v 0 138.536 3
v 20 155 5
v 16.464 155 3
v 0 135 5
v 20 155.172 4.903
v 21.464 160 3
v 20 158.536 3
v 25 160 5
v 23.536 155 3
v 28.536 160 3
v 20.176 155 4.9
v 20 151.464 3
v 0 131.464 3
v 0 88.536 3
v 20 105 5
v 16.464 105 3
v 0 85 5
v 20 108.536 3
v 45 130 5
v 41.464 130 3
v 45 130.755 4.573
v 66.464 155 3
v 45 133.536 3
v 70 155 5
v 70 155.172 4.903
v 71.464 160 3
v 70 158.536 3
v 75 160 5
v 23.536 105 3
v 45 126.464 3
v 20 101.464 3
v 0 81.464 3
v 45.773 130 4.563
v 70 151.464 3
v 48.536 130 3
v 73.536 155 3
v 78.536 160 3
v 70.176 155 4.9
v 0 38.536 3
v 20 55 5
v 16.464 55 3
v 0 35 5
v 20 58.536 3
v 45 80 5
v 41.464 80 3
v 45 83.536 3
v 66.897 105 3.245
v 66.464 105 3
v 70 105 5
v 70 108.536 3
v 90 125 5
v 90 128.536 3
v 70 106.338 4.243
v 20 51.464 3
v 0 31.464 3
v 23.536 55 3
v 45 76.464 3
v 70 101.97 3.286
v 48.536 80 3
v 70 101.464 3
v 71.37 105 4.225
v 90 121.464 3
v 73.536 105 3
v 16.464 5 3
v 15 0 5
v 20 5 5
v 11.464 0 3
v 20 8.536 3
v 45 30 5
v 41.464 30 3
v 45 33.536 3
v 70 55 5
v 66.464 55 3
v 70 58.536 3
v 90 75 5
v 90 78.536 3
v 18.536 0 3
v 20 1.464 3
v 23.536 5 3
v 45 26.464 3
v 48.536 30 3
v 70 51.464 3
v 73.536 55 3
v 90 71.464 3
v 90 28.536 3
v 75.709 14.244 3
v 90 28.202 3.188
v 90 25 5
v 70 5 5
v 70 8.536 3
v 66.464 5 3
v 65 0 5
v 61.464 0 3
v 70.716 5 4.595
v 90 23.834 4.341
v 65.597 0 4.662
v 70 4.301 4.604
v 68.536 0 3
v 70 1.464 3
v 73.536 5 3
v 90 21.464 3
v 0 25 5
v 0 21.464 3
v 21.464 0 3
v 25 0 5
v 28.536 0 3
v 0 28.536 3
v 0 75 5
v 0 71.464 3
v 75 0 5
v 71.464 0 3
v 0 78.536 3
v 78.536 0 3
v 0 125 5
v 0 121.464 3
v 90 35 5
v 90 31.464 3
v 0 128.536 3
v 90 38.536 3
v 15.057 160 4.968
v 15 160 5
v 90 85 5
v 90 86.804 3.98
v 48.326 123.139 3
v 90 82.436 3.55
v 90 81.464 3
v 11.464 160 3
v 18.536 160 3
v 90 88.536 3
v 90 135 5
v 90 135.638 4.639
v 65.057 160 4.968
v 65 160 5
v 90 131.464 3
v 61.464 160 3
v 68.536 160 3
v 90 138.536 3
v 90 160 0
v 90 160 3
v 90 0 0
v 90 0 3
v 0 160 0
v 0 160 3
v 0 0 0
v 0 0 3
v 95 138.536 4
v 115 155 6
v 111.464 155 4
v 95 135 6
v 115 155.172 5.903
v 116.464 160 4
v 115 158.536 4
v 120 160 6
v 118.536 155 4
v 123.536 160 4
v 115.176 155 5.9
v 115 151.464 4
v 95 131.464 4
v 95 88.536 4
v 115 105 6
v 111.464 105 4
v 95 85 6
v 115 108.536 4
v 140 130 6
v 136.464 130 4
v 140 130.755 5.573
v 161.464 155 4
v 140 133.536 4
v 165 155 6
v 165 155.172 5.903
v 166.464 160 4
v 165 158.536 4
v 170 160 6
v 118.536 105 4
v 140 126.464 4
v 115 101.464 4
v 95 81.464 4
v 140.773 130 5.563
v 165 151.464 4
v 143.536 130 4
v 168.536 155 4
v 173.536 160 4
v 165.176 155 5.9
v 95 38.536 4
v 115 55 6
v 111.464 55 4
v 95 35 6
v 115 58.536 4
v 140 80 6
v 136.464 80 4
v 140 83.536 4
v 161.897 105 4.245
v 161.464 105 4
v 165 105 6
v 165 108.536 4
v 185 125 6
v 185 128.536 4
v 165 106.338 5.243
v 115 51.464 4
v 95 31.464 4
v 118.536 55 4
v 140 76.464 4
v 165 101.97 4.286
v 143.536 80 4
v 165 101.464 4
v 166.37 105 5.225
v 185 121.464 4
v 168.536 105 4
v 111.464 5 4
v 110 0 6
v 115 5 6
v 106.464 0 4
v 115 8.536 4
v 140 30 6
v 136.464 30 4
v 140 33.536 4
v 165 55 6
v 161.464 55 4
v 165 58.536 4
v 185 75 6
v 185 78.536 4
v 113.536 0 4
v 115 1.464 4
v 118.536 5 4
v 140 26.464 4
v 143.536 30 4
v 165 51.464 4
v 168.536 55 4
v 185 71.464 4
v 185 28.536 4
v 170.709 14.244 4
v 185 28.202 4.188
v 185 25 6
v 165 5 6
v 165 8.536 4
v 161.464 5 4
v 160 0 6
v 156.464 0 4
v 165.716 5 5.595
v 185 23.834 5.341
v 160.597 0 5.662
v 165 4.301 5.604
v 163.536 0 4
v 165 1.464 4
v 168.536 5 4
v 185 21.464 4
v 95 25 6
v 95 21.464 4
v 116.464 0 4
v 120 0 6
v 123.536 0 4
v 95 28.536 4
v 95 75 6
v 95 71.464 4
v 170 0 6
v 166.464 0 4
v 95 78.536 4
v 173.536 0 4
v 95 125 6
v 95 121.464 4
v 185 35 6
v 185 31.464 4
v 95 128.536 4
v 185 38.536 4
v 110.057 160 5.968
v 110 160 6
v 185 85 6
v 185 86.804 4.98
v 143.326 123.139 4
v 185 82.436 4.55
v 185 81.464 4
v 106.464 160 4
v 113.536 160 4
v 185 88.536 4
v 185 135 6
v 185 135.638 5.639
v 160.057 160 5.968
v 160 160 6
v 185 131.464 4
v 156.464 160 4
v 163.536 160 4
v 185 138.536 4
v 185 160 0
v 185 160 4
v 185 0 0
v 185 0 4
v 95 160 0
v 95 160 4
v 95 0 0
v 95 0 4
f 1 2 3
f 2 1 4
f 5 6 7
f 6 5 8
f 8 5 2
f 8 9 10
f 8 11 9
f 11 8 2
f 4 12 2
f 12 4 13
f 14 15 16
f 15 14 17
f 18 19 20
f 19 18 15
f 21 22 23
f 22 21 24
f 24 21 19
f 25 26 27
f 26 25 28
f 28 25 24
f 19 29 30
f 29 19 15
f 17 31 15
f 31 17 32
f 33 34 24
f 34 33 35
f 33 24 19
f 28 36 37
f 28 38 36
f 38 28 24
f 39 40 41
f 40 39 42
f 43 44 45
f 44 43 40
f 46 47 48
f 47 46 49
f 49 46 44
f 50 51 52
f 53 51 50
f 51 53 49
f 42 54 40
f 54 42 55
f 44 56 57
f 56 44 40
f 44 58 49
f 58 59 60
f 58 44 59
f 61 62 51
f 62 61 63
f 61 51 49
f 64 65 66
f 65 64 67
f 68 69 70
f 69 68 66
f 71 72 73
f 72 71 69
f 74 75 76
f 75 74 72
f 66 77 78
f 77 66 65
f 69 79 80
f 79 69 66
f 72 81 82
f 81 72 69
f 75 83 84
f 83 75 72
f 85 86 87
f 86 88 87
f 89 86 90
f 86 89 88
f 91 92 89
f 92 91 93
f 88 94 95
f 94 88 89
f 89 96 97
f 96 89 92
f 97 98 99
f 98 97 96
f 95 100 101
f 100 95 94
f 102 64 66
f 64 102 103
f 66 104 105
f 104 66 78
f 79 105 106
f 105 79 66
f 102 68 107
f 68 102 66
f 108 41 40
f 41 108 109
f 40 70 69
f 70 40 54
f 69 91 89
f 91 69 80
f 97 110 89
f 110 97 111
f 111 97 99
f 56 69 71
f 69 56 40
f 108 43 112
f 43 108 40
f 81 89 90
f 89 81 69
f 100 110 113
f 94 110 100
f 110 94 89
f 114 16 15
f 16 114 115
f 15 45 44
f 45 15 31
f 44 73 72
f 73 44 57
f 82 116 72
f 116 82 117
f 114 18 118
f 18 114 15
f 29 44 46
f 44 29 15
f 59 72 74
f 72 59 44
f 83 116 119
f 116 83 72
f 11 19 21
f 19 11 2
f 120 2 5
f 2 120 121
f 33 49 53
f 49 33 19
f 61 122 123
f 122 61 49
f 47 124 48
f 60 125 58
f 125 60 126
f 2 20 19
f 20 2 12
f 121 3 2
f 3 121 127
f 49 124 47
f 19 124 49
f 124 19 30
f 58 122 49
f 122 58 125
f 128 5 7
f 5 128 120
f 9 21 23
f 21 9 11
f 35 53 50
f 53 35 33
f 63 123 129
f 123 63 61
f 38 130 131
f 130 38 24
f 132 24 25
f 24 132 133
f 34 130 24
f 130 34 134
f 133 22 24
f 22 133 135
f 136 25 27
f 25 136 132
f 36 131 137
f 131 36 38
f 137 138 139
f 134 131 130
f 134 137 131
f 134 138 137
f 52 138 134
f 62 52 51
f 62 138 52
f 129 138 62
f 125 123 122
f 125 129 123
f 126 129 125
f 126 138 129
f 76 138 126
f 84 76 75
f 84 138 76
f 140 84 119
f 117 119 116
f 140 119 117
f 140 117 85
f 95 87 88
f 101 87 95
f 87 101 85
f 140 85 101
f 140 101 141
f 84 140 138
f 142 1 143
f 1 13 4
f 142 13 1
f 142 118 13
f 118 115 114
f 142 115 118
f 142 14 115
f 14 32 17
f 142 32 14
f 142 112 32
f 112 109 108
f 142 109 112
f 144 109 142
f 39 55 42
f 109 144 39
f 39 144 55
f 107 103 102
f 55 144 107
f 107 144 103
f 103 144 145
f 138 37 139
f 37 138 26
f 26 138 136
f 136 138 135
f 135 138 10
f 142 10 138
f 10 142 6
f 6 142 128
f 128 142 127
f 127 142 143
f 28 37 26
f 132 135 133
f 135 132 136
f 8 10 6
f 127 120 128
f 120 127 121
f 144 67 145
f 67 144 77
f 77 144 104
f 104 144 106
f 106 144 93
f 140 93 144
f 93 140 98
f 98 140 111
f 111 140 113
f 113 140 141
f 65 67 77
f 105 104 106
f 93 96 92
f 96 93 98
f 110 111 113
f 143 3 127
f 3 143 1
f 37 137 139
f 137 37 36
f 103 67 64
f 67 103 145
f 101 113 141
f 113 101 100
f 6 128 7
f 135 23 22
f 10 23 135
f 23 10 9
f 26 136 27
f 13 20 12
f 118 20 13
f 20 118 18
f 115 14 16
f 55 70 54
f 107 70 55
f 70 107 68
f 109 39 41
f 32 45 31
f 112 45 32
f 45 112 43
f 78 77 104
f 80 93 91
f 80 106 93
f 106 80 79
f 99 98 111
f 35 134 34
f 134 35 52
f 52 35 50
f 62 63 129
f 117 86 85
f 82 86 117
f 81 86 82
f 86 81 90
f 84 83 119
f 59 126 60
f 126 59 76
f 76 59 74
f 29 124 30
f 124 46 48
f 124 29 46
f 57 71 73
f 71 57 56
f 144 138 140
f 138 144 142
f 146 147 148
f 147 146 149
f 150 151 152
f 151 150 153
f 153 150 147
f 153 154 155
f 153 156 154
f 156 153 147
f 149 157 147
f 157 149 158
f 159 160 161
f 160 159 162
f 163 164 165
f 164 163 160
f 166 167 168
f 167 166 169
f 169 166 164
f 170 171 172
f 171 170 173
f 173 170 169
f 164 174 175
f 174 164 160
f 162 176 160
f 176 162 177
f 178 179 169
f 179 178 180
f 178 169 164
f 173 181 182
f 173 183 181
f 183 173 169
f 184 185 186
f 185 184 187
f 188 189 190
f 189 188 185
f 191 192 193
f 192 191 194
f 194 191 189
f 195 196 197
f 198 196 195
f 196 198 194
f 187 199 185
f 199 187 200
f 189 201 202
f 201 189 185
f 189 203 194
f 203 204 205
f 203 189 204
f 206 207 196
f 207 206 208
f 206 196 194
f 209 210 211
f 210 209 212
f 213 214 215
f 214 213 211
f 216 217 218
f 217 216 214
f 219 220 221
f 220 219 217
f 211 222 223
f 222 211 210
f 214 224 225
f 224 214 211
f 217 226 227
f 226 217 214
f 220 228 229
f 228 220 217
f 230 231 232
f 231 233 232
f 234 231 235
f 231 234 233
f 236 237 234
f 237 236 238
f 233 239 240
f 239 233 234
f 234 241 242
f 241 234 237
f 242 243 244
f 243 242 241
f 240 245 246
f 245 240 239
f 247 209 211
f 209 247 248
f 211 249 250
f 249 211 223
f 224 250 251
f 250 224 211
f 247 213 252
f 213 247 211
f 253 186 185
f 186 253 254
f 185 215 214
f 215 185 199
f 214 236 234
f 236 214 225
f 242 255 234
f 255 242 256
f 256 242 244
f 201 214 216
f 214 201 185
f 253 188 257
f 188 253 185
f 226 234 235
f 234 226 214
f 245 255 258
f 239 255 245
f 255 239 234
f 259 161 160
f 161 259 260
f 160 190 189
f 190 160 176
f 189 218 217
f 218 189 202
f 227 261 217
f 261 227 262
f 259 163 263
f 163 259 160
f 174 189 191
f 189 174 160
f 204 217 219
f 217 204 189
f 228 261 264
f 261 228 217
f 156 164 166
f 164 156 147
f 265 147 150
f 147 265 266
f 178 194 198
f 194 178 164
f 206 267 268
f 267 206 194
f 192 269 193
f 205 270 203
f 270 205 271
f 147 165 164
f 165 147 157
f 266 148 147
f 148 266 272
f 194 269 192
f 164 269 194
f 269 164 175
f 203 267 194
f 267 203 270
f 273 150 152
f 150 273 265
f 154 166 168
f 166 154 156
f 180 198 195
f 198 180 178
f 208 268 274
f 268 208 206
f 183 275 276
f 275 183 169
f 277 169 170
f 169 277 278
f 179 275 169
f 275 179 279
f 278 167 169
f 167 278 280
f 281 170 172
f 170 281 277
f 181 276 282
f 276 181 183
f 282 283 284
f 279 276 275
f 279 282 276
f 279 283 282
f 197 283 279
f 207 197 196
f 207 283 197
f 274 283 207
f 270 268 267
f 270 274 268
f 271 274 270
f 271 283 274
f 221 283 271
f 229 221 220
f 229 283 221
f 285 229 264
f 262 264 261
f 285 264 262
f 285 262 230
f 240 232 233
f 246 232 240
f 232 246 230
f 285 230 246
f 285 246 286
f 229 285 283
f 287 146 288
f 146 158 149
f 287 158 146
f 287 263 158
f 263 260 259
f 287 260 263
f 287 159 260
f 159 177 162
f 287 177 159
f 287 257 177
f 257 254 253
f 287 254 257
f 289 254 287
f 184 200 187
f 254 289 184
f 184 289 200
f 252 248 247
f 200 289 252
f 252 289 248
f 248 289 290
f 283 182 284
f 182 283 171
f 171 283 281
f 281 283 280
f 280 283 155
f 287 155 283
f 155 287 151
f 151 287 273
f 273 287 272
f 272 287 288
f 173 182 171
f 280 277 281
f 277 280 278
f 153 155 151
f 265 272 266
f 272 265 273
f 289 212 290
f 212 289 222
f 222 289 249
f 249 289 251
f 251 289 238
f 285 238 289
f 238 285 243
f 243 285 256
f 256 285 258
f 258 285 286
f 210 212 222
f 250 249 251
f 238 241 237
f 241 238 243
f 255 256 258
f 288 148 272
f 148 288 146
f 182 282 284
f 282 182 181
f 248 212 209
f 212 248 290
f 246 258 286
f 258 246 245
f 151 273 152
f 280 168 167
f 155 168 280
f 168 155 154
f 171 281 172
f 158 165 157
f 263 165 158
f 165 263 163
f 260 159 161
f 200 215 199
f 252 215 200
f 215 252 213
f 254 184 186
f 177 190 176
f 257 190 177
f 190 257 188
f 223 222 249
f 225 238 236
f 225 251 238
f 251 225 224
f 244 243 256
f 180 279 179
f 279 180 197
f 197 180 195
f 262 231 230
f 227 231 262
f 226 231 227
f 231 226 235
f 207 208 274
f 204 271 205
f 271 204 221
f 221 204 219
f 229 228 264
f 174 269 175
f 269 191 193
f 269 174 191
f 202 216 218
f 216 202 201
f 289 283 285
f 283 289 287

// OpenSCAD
// file: common.scad
spike_width = 25;
spike_height = 2;
spike_intersect = 0.5;
spike_distance = 50;

wall_width = 2;
rail_width = 10;
rail_height = 20;
rail_hole_width = 3;
rail_hole_height = 8;
rail_arch_radius = 10;

module spike(length) {
    x = spike_intersect * spike_width / 2 / spike_height;
    echo(x);
    rotate([90, 0, 90])
    linear_extrude(height=length)
    polygon([
        [-x, -spike_intersect],
        [x, -spike_intersect],
        [0, spike_height]]);
}

module spike_mesh(length, width) {
   underhang = spike_width;
   spike_length_approx = width * 1.5 + underhang;
   intersection() {
      translate([0, 0, -spike_intersect])
      cube([length, width, spike_height + spike_intersect]);

      union() {
         for (x = [-width : spike_distance : length]) {
            translate([x, -underhang, 0])
            rotate([0, 0, 45])
            spike(spike_length_approx);
         }

         for (x = [0 : spike_distance : length + width]) {
            translate([x, -underhang, 0])
            rotate([0, 0, 135])
            spike(spike_length_approx);
         }
      }
   }
}

module spiked_plate(length, width, thickness) {
   union() {
      cube([length, width, thickness]);
      translate([0, 0, thickness])
      spike_mesh(length, width);
   }
}

module rail(length) {
    rotate([90, 0, 90])
    linear_extrude(height=length) {
        difference() {
            hole_x = (rail_width - rail_hole_width) / 2;

            hole_y = rail_height - rail_hole_height;

            arch_x = rail_arch_radius + wall_width;
            arch_y = 0;

            square([rail_width, rail_height]);
            translate([hole_x, hole_y]) {
                square([rail_hole_width, rail_hole_height + 1]);
            }
            translate([arch_x, arch_y]) {
                circle(rail_arch_radius);
            }

        }
    }
}

module cylinder_outer(height, diameter, fs) {
   radius = diameter / 2;
   fn = floor(360 / acos(1 - (fs*fs) / (2*radius*radius)));
   fudge = 1/cos(180/fn);
   cylinder(h=height, d=diameter*fudge, $fn=fn);
}

module rail_corner() {
    hole_position = (rail_width - rail_hole_width) / 2;
    hole_position_z = rail_height - rail_hole_height;
    length = rail_width + 1;
    render()
    difference() {
        union() {
            rail(length=length);
            translate([0, length, 0])
            rotate([0, 0, -90])
            rail(length=length);
        }
        translate([hole_position, hole_position, hole_position_z])
        cube([rail_width, rail_hole_width, rail_hole_height + 1]);
        translate([hole_position, hole_position, hole_position_z])
        cube([rail_hole_width, rail_width, rail_hole_height + 1]);
    }
}
// main file
include <common.scad>

length = 90;
width = 160;
gap = 5;

spiked_plate(length, width, 3);

translate([length + gap, 0, 0])
spiked_plate(length, width, 4);
